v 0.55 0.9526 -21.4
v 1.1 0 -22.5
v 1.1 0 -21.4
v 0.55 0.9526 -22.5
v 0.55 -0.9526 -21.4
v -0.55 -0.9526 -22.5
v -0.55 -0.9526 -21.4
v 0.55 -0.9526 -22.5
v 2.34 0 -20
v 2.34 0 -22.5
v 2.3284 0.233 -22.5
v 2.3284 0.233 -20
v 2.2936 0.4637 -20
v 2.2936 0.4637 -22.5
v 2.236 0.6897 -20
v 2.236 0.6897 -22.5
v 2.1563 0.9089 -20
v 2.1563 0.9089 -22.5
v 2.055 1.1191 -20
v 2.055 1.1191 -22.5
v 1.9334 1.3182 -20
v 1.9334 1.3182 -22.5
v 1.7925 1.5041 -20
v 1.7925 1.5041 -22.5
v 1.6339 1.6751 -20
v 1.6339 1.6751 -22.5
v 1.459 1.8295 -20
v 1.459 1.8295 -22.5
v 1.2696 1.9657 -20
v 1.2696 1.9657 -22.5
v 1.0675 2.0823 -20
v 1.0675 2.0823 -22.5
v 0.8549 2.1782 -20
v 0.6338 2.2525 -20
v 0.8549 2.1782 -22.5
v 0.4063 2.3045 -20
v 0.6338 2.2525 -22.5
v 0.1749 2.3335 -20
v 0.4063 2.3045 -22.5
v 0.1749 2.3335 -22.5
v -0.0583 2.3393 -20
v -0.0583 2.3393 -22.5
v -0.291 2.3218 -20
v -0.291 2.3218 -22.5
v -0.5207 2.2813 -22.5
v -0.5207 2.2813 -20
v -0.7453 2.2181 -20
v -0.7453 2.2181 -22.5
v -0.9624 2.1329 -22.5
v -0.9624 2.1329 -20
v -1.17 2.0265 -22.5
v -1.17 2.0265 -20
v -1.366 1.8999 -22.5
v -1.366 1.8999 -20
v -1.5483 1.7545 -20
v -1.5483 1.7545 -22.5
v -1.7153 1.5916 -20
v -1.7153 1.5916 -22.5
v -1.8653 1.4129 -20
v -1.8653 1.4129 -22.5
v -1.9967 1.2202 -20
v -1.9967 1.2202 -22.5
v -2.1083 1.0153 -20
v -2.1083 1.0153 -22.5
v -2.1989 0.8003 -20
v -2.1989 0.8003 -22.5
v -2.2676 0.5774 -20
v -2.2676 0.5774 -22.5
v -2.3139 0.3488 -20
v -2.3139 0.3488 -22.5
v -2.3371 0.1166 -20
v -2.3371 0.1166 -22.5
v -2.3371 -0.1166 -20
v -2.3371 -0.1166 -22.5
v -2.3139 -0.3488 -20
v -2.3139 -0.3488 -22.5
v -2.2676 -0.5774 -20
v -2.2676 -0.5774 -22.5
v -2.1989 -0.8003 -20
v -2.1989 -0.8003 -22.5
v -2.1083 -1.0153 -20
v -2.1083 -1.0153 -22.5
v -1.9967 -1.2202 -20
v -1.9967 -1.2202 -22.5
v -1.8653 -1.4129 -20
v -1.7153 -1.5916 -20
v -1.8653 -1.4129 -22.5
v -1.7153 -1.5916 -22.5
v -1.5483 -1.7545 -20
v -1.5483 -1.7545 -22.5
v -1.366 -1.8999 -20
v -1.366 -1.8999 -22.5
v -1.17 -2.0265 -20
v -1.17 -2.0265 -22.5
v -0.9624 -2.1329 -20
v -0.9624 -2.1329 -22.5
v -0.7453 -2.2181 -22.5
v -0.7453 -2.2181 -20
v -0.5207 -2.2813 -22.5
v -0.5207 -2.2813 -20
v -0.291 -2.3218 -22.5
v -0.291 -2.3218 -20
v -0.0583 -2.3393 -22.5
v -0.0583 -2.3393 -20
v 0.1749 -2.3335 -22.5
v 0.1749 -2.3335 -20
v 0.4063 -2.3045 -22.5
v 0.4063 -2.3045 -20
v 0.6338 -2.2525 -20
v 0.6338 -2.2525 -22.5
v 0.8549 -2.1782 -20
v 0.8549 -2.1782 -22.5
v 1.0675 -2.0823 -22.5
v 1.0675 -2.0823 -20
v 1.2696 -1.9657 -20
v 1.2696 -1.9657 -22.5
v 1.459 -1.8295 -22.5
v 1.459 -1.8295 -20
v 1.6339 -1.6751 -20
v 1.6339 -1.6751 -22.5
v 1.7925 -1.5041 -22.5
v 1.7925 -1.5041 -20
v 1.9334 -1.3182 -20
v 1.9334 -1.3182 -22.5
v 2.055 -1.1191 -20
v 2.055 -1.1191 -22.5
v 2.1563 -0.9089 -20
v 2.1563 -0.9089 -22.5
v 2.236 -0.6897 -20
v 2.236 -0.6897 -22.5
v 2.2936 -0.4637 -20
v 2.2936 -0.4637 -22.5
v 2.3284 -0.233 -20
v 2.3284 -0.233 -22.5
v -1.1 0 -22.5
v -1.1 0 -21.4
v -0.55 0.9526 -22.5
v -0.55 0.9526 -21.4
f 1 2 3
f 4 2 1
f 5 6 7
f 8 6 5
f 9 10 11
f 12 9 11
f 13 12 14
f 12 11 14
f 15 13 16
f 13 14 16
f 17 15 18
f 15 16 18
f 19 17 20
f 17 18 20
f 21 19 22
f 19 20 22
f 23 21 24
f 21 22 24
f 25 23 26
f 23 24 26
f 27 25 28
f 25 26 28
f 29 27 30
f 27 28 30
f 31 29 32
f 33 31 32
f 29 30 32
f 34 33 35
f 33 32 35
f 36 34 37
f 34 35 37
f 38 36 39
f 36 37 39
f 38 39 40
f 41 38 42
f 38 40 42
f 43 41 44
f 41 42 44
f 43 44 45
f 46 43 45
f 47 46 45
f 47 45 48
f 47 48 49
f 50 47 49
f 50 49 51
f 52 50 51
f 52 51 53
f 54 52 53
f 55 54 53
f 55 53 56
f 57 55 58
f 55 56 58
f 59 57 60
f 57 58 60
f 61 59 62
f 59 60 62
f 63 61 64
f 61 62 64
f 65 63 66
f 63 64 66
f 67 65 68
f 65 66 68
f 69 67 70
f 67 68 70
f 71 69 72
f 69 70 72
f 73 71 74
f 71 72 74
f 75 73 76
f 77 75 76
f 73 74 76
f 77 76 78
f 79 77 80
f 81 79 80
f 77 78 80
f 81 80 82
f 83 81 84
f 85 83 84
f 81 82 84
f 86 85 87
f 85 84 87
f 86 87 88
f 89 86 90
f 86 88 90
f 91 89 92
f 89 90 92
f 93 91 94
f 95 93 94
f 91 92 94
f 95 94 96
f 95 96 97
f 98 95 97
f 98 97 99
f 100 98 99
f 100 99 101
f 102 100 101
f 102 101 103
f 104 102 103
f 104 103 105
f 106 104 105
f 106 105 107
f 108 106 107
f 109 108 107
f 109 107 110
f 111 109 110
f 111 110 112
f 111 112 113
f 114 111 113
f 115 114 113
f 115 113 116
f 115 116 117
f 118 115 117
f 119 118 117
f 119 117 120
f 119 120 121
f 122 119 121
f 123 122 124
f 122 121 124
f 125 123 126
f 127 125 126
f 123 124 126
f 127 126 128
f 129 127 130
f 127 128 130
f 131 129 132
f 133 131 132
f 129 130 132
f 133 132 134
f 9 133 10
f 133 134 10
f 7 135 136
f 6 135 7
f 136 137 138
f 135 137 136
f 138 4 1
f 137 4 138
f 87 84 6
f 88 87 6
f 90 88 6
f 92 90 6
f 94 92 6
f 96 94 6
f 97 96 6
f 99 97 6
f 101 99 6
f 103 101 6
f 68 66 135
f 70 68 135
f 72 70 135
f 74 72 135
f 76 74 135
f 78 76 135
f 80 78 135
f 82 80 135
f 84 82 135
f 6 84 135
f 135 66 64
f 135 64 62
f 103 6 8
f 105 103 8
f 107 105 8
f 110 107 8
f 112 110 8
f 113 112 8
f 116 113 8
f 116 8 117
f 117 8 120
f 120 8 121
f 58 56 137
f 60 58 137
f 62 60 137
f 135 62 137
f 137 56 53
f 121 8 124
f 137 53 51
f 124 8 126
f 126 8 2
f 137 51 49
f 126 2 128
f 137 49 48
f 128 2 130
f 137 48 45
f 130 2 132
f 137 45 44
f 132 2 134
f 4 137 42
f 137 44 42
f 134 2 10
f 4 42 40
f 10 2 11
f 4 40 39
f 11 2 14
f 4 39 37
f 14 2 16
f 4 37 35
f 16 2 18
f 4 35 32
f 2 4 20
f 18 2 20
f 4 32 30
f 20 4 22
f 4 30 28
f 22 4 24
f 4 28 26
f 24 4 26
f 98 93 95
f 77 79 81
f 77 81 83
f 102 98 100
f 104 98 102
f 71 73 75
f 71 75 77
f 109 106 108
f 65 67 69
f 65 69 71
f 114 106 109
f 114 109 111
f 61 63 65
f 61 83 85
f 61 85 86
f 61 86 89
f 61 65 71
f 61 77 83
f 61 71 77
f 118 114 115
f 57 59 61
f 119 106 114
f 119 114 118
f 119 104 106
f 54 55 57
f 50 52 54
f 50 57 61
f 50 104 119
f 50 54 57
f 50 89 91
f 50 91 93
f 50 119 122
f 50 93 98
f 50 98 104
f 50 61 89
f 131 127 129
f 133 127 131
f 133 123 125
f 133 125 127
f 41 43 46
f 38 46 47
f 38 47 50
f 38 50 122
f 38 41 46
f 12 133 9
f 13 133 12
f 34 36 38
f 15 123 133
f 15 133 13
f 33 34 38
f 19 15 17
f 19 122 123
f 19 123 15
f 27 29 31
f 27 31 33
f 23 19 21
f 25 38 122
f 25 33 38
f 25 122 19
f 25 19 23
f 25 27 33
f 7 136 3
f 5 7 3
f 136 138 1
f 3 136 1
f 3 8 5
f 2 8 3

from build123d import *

# Parameters (mm, degrees)
PRISM014_DEPTH    = 1.1
CYLINDER068_R     = 2.34
CYLINDER068_DEPTH = 2.5


with BuildPart() as prism014:
    # Prism014 → Prism014 (new body)
    with BuildSketch(Plane.XY.offset(-23)):
        Polygon((1.1, 0), (0.55, 0.952628), (-0.55, 0.952628), (-1.1, 0), (-0.55, -0.952628), (0.55, -0.952628), align=None)
    extrude(amount=PRISM014_DEPTH)


with BuildPart() as cut060:
    # Cylinder068 → Cylinder068 (new body)
    with BuildSketch(Plane.XY.offset(-23)):
        Circle(CYLINDER068_R)
    extrude(amount=CYLINDER068_DEPTH)

    # Cut060: cut Prism014
    add(prism014.part, mode=Mode.SUBTRACT)


with BuildPart() as cut060_1:
    # Cut060 placement: moved
    add(cut060.part.moved(Location((0, 0, 0.5))))


solid = cut060_1.part
